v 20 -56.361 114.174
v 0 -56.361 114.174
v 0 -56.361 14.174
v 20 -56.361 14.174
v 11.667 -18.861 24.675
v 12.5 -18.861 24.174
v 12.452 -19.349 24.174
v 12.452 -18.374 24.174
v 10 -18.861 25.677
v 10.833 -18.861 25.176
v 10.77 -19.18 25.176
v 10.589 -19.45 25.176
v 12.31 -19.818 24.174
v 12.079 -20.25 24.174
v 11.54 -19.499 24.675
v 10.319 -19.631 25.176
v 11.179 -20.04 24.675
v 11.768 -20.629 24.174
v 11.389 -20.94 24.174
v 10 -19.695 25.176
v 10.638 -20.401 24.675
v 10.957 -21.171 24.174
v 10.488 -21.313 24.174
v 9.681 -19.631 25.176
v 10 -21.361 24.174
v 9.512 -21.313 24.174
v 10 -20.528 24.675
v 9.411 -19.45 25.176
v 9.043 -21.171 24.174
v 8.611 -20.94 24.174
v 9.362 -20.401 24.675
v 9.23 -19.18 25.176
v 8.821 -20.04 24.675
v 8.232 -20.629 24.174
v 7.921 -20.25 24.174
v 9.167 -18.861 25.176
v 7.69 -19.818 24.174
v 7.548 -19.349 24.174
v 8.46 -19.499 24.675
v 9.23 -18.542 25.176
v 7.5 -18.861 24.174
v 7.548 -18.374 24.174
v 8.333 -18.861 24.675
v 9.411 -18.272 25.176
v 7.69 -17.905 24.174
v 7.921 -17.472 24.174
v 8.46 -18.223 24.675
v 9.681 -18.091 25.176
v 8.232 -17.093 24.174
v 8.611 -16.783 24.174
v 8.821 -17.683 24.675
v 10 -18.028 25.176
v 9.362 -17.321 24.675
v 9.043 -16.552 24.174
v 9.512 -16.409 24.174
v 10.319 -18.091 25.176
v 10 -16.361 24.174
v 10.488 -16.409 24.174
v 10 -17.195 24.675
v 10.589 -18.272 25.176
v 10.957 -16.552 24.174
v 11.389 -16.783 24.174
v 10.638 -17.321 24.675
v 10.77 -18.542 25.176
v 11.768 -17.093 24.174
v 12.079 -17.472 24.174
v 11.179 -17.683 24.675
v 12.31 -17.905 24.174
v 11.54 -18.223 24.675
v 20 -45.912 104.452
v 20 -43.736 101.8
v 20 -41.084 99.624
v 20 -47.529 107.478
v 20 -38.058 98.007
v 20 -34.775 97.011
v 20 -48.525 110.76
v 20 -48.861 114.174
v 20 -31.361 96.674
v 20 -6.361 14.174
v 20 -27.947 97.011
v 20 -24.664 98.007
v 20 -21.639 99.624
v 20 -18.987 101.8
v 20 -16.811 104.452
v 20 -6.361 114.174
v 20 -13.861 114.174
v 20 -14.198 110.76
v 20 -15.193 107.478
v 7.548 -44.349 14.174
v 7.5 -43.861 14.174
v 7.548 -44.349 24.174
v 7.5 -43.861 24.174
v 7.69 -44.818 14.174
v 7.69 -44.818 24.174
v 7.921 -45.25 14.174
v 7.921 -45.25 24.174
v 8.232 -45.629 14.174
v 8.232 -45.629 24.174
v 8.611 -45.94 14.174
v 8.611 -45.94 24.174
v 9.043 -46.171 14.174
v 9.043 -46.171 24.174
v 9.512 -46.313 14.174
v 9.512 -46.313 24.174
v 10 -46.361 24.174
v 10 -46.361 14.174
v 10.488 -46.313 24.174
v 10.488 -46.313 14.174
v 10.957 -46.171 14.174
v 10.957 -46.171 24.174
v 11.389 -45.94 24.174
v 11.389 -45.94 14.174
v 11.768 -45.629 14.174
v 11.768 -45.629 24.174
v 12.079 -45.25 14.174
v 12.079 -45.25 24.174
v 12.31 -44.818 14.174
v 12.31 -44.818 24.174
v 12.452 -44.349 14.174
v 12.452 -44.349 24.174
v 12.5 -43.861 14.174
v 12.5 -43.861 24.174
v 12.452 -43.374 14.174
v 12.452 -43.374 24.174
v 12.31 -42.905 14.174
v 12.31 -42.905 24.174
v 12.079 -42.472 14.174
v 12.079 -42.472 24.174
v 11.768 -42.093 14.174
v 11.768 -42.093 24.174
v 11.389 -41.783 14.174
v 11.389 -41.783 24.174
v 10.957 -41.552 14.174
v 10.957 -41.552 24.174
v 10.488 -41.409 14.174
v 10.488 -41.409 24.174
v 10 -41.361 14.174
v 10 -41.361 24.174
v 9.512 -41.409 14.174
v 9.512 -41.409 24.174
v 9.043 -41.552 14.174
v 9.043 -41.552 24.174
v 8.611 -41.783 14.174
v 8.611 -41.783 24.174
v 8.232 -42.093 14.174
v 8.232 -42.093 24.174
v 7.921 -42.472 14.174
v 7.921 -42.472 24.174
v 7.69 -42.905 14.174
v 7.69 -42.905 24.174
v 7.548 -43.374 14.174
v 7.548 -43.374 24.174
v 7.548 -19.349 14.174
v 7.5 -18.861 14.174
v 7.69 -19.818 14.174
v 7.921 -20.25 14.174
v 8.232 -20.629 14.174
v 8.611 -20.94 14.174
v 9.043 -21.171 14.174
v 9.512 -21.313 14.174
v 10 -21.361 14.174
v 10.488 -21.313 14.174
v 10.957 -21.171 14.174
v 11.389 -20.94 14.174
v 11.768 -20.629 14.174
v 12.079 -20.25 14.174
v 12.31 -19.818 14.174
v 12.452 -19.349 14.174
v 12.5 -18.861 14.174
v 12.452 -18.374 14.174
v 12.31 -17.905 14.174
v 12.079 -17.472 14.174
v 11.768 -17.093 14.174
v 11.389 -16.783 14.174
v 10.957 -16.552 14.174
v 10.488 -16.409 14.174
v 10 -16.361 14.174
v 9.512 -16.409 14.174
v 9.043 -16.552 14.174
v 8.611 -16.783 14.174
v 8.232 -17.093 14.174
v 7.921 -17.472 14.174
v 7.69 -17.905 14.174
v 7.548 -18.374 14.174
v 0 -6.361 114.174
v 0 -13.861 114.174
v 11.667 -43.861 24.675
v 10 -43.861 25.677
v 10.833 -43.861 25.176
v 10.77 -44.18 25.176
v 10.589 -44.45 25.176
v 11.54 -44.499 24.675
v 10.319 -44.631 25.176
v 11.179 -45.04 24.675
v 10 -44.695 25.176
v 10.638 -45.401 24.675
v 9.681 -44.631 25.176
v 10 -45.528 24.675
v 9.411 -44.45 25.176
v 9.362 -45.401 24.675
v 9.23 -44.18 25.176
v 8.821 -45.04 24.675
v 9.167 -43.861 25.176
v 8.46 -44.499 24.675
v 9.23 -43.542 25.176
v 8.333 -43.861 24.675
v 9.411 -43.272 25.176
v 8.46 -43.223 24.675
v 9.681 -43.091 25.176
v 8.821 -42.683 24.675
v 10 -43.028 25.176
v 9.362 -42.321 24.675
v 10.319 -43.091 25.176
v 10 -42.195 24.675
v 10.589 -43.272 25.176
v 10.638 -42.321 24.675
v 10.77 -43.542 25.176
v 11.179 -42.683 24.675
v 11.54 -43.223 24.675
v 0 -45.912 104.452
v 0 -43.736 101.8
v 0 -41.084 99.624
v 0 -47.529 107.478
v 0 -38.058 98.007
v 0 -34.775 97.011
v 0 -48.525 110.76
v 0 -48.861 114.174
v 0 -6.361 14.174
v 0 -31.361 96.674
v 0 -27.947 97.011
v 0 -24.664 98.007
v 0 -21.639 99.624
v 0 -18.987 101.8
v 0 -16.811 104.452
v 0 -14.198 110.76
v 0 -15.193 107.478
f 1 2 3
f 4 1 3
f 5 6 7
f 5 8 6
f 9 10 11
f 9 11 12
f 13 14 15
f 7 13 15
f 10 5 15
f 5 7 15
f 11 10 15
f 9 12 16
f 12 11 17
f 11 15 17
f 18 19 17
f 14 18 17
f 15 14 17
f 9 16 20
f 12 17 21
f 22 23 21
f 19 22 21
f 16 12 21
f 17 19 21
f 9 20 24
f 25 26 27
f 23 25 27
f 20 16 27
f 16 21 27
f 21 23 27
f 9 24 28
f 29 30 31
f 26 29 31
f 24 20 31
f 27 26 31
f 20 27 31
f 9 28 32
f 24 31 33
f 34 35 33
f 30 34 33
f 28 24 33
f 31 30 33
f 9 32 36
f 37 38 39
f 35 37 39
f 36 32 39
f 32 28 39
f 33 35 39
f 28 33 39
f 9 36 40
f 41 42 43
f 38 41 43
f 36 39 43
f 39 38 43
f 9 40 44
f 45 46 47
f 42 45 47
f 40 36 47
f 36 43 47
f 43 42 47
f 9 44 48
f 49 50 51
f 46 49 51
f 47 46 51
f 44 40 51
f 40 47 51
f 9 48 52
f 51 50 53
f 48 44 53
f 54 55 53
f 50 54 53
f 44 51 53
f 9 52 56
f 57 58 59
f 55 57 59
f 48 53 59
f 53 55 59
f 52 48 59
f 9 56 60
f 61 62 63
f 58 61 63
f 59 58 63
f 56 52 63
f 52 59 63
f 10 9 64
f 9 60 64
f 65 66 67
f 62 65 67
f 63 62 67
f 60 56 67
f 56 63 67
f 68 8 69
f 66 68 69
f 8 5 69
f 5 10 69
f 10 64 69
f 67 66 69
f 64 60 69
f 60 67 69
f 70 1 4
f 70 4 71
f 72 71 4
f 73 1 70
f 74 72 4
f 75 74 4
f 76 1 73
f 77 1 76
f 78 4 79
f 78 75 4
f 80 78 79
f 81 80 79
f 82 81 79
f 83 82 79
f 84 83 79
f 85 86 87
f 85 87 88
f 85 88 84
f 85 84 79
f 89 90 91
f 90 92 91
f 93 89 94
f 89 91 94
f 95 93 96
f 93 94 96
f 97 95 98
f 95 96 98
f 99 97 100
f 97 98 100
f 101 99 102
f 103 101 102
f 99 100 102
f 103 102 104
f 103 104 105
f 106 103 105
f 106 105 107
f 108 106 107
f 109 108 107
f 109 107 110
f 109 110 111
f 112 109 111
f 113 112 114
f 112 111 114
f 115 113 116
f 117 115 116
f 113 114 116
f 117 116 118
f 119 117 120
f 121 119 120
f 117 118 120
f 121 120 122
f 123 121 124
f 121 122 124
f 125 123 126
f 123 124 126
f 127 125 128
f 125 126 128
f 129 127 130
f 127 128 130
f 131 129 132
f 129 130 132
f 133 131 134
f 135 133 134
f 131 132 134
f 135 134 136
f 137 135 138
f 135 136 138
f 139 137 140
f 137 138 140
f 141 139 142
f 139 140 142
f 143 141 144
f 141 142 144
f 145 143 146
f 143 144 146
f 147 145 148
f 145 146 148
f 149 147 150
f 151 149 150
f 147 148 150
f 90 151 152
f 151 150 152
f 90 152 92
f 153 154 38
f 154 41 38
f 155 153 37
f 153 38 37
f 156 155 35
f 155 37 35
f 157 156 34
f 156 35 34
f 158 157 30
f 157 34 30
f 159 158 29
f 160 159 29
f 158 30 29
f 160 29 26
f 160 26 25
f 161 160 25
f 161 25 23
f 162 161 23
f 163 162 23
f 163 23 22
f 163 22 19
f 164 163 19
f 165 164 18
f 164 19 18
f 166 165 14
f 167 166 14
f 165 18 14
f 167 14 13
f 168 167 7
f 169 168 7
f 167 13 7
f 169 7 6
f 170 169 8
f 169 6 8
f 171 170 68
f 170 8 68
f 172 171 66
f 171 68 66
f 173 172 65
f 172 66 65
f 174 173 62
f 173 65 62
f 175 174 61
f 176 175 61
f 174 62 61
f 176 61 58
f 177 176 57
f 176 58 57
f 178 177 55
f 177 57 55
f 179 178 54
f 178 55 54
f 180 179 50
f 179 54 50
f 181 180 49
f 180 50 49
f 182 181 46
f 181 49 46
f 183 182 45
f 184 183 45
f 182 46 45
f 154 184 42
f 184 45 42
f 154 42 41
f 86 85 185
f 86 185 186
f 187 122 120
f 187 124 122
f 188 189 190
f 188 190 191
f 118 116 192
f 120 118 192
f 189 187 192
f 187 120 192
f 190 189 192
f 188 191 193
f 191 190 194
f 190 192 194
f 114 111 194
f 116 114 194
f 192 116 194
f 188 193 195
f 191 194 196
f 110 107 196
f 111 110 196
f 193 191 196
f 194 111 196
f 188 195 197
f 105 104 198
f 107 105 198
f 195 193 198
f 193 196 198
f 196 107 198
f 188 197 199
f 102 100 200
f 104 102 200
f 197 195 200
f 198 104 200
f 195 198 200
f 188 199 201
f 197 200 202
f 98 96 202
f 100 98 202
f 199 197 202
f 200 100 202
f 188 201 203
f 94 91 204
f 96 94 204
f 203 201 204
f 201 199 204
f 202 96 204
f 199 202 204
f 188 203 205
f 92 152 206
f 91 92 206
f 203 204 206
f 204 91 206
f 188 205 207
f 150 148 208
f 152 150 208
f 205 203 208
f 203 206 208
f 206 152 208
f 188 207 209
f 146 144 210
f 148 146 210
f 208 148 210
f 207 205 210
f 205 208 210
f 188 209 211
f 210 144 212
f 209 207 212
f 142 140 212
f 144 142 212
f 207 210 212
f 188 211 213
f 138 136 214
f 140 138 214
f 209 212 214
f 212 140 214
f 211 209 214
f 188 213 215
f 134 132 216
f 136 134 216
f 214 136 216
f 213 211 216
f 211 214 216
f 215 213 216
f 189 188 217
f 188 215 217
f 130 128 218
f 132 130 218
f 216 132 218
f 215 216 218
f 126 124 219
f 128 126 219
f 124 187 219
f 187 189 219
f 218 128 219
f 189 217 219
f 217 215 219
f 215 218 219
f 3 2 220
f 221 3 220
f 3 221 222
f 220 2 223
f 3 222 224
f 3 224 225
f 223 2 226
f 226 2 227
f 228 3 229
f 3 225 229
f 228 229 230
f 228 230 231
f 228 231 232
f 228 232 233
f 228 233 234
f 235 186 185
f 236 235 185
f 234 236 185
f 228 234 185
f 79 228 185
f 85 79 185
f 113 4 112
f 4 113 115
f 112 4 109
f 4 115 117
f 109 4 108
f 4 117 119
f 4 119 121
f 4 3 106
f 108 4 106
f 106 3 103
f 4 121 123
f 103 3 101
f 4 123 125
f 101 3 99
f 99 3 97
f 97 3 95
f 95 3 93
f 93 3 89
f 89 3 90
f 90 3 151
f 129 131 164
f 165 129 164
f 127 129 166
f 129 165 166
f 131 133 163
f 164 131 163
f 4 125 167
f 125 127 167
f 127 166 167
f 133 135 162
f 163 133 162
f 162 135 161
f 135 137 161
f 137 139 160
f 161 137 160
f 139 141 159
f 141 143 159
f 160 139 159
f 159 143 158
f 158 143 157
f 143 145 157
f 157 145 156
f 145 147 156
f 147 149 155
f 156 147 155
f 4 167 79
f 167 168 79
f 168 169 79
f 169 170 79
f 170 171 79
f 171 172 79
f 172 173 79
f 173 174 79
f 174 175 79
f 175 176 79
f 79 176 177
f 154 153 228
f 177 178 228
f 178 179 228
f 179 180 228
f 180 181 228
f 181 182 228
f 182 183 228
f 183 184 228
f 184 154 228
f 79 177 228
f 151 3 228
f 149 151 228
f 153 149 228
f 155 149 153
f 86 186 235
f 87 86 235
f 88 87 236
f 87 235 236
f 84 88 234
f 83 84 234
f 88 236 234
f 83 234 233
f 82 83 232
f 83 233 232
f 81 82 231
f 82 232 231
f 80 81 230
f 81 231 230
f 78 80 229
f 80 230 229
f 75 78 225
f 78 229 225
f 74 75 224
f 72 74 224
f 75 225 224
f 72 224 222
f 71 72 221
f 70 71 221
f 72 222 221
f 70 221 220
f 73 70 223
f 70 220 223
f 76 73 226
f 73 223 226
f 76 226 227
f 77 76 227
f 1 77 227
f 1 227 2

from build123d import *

# Parameters (mm, degrees)
F1_DEPTH = 20
F3_D     = 5
F3_DEPTH = 10
F3_TIP   = 1.5021515476
F4_D     = 5
F4_DEPTH = 10
F4_TIP   = 1.5021515476


with BuildPart() as f1:
    # F0 (on Right) → F1 (new body)
    with BuildSketch(Plane.YZ):
        with BuildLine():
            Line((-56.3612431288, 114.1744827852), (-56.3612431288, 14.1744827852))
            Line((-56.3612431288, 14.1744827852), (-6.3612431288, 14.1744827852))
            Line((-6.3612431288, 14.1744827852), (-6.3612431288, 114.1744827852))
            Line((-6.3612431288, 114.1744827852), (-13.8612431288, 114.1744827852))
            ThreePointArc((-13.8612431288, 114.1744827852), (-31.3612431288, 96.6744827852), (-48.8612431288, 114.1744827852))
            Line((-48.8612431288, 114.1744827852), (-56.3612431288, 114.1744827852))
        make_face()
    extrude(amount=F1_DEPTH)

    # F3
    with Locations(Plane(origin=(0, 0, 14.1744827852), x_dir=(1, 0, 0), z_dir=(0, 0, -1))):
        with Locations((10, 43.8612431288)):
            Hole(F3_D / 2, depth=F3_DEPTH)
            with Locations((0, 0, -(F3_DEPTH + F3_TIP / 2))):  # 118° drill point
                Cone(0, F3_D / 2, F3_TIP, mode=Mode.SUBTRACT)

    # F4
    with Locations(Plane(origin=(0, 0, 14.1744827852), x_dir=(1, 0, 0), z_dir=(0, 0, -1))):
        with Locations((10, 18.8612431288)):
            Hole(F4_D / 2, depth=F4_DEPTH)
            with Locations((0, 0, -(F4_DEPTH + F4_TIP / 2))):  # 118° drill point
                Cone(0, F4_D / 2, F4_TIP, mode=Mode.SUBTRACT)


solid = f1.part
